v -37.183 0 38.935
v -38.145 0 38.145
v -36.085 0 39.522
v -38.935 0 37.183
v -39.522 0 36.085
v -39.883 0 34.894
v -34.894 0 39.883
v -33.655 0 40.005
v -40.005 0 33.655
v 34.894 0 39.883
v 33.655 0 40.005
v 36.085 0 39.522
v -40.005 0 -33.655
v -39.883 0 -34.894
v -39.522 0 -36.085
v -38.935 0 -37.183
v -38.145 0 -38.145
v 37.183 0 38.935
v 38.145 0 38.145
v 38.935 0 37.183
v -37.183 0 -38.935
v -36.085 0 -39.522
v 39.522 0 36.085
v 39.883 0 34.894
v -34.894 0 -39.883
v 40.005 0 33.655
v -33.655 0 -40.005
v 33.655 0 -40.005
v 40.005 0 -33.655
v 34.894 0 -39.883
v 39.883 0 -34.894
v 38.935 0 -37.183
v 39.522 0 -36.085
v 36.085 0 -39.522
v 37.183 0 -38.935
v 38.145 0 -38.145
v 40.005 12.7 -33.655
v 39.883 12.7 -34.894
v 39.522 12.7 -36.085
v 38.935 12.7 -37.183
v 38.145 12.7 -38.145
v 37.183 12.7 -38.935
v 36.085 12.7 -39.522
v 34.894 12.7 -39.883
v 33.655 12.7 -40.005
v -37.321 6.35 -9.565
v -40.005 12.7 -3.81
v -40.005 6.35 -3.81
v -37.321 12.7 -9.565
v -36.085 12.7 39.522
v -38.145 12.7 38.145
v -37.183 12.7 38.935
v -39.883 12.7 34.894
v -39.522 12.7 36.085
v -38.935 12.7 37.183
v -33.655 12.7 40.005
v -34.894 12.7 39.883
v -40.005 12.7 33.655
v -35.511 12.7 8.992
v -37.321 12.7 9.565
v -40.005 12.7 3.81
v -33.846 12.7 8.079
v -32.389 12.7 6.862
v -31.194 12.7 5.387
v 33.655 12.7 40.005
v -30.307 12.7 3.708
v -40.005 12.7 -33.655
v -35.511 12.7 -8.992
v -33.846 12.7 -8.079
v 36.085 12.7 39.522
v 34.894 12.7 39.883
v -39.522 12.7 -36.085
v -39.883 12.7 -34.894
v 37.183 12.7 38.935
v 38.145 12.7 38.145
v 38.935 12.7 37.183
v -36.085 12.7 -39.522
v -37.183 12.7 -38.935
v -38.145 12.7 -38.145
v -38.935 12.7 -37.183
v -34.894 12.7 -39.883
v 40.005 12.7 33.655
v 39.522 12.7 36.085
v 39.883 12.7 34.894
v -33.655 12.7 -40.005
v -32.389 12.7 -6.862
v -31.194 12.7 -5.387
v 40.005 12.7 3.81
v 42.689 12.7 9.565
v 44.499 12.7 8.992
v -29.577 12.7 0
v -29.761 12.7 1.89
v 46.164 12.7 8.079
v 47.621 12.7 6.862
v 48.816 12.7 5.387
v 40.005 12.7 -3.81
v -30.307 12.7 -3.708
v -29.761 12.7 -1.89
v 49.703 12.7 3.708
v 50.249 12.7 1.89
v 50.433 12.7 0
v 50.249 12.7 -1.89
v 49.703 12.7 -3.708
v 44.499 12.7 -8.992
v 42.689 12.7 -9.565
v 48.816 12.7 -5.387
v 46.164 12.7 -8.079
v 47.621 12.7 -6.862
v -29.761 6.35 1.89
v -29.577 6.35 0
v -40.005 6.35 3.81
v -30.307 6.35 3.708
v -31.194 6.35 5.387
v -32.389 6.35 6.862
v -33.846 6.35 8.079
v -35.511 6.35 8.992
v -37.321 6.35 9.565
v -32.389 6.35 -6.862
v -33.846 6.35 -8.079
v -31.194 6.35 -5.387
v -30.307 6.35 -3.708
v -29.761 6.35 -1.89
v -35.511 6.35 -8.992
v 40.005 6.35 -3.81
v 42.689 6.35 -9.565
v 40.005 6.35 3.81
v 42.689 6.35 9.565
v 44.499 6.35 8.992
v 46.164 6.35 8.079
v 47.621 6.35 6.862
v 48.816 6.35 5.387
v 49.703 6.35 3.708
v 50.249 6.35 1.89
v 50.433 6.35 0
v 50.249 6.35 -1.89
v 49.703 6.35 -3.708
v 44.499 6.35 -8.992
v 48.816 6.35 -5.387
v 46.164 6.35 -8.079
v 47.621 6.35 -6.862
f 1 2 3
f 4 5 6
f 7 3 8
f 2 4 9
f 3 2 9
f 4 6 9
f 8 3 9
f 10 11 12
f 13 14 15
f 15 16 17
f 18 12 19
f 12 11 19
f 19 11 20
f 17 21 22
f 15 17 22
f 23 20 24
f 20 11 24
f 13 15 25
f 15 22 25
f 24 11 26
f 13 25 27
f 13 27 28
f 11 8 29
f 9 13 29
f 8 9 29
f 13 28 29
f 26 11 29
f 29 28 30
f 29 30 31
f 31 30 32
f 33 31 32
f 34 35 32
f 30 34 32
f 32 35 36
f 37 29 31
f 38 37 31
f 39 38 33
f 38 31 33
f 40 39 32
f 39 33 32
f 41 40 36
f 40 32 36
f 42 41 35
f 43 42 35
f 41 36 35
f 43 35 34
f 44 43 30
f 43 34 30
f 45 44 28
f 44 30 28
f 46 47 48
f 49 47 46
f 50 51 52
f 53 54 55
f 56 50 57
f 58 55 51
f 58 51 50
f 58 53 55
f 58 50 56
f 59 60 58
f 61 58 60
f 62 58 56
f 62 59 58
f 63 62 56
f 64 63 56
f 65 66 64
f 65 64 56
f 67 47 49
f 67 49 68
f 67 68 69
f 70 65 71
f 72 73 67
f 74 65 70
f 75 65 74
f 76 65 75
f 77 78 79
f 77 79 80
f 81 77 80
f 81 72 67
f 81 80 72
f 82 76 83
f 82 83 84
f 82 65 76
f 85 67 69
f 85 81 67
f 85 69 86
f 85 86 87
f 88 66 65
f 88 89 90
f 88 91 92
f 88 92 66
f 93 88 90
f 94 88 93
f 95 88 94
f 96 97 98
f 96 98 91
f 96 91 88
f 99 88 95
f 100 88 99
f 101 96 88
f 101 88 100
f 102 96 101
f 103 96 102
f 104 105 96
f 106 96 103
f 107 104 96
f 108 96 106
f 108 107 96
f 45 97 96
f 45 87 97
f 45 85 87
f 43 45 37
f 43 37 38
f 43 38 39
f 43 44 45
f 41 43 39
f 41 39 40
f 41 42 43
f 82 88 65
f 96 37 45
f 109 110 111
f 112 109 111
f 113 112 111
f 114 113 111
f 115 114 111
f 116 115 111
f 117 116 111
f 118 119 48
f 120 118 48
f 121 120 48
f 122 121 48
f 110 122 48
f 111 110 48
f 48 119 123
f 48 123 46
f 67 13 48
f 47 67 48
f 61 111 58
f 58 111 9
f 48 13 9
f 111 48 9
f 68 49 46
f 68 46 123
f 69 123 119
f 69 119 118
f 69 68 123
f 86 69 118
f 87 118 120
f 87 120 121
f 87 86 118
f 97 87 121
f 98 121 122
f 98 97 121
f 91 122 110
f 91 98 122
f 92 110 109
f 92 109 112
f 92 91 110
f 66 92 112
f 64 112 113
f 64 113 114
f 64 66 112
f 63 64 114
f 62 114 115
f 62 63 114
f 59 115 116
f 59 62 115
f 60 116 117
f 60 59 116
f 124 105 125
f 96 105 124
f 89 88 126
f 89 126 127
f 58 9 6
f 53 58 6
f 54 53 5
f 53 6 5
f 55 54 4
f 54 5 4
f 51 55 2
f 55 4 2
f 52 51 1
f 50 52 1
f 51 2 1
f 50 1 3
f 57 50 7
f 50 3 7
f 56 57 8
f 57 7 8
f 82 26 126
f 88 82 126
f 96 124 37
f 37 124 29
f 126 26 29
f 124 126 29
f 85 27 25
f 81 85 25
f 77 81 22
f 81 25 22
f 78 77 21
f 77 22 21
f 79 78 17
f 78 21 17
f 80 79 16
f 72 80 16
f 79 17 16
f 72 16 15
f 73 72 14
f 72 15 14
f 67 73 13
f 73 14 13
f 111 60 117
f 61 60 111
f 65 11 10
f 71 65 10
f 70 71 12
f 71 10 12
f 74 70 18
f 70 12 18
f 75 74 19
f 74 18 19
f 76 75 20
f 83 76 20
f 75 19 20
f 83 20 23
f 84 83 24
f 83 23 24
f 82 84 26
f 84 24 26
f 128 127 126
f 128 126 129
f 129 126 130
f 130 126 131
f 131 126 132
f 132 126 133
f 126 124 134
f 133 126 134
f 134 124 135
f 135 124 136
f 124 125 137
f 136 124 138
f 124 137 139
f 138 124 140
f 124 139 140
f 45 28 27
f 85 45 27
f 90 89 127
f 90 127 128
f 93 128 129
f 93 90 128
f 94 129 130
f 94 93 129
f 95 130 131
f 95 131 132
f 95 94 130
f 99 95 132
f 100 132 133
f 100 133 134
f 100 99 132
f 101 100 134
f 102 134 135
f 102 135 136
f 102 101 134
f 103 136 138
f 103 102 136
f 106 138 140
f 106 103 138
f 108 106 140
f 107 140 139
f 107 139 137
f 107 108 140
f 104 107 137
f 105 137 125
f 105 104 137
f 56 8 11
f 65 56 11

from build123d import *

# Parameters (mm, degrees)
BOSS_EXTRUDE1_DEPTH = 12.7
CUT_EXTRUDE1_DEPTH  = 6.35
BOSS_EXTRUDE2_DEPTH = 6.35


with BuildPart() as part:
    # Sketch1 → Boss-Extrude1 (new body)
    with BuildSketch(Plane(origin=(0, 0, 0), x_dir=(1, 0, 0), z_dir=(0, 1, 0))):
        with BuildLine():
            Line((-33.655, -40.005), (33.655, -40.005))
            ThreePointArc((33.655, -40.005), (38.145128061, -38.145128061), (40.005, -33.655))
            Line((40.005, -33.655), (40.005, 33.655))
            ThreePointArc((40.005, 33.655), (38.145128061, 38.145128061), (33.655, 40.005))
            Line((33.655, 40.005), (-33.655, 40.005))
            ThreePointArc((-33.655, 40.005), (-38.145128061, 38.145128061), (-40.005, 33.655))
            Line((-40.005, 33.655), (-40.005, -33.655))
            ThreePointArc((-40.005, -33.655), (-38.145128061, -38.145128061), (-33.655, -40.005))
        make_face()
    extrude(amount=BOSS_EXTRUDE1_DEPTH)

    # Sketch2 → Cut-Extrude1 (cut)
    with BuildSketch(Plane(origin=(0, 12.7, 0), x_dir=(1, 0, 0), z_dir=(0, 1, 0))):
        with BuildLine():
            Line((-40.005, 3.81), (-37.321374038, 9.565054448))
            ThreePointArc((-37.321374038, 9.565054448), (-29.576722684, 0), (-37.321374038, -9.565054448))
            Line((-37.321374038, -9.565054448), (-40.005, -3.81))
            Line((-40.005, -3.81), (-40.005, 3.81))
        make_face()
    extrude(amount=-CUT_EXTRUDE1_DEPTH, mode=Mode.SUBTRACT)

    # Sketch4 → Boss-Extrude2 (add)
    with BuildSketch(Plane(origin=(0, 12.7, 0), x_dir=(1, 0, 0), z_dir=(0, 1, 0))):
        with BuildLine():
            Line((42.688625962, 9.565054448), (40.005, 3.81))
            Line((40.005, 3.81), (40.005, -3.81))
            Line((40.005, -3.81), (42.688625962, -9.565054448))
            ThreePointArc((42.688625962, -9.565054448), (50.433277316, 0), (42.688625962, 9.565054448))
        make_face()
    extrude(amount=-BOSS_EXTRUDE2_DEPTH)


solid = part.part
